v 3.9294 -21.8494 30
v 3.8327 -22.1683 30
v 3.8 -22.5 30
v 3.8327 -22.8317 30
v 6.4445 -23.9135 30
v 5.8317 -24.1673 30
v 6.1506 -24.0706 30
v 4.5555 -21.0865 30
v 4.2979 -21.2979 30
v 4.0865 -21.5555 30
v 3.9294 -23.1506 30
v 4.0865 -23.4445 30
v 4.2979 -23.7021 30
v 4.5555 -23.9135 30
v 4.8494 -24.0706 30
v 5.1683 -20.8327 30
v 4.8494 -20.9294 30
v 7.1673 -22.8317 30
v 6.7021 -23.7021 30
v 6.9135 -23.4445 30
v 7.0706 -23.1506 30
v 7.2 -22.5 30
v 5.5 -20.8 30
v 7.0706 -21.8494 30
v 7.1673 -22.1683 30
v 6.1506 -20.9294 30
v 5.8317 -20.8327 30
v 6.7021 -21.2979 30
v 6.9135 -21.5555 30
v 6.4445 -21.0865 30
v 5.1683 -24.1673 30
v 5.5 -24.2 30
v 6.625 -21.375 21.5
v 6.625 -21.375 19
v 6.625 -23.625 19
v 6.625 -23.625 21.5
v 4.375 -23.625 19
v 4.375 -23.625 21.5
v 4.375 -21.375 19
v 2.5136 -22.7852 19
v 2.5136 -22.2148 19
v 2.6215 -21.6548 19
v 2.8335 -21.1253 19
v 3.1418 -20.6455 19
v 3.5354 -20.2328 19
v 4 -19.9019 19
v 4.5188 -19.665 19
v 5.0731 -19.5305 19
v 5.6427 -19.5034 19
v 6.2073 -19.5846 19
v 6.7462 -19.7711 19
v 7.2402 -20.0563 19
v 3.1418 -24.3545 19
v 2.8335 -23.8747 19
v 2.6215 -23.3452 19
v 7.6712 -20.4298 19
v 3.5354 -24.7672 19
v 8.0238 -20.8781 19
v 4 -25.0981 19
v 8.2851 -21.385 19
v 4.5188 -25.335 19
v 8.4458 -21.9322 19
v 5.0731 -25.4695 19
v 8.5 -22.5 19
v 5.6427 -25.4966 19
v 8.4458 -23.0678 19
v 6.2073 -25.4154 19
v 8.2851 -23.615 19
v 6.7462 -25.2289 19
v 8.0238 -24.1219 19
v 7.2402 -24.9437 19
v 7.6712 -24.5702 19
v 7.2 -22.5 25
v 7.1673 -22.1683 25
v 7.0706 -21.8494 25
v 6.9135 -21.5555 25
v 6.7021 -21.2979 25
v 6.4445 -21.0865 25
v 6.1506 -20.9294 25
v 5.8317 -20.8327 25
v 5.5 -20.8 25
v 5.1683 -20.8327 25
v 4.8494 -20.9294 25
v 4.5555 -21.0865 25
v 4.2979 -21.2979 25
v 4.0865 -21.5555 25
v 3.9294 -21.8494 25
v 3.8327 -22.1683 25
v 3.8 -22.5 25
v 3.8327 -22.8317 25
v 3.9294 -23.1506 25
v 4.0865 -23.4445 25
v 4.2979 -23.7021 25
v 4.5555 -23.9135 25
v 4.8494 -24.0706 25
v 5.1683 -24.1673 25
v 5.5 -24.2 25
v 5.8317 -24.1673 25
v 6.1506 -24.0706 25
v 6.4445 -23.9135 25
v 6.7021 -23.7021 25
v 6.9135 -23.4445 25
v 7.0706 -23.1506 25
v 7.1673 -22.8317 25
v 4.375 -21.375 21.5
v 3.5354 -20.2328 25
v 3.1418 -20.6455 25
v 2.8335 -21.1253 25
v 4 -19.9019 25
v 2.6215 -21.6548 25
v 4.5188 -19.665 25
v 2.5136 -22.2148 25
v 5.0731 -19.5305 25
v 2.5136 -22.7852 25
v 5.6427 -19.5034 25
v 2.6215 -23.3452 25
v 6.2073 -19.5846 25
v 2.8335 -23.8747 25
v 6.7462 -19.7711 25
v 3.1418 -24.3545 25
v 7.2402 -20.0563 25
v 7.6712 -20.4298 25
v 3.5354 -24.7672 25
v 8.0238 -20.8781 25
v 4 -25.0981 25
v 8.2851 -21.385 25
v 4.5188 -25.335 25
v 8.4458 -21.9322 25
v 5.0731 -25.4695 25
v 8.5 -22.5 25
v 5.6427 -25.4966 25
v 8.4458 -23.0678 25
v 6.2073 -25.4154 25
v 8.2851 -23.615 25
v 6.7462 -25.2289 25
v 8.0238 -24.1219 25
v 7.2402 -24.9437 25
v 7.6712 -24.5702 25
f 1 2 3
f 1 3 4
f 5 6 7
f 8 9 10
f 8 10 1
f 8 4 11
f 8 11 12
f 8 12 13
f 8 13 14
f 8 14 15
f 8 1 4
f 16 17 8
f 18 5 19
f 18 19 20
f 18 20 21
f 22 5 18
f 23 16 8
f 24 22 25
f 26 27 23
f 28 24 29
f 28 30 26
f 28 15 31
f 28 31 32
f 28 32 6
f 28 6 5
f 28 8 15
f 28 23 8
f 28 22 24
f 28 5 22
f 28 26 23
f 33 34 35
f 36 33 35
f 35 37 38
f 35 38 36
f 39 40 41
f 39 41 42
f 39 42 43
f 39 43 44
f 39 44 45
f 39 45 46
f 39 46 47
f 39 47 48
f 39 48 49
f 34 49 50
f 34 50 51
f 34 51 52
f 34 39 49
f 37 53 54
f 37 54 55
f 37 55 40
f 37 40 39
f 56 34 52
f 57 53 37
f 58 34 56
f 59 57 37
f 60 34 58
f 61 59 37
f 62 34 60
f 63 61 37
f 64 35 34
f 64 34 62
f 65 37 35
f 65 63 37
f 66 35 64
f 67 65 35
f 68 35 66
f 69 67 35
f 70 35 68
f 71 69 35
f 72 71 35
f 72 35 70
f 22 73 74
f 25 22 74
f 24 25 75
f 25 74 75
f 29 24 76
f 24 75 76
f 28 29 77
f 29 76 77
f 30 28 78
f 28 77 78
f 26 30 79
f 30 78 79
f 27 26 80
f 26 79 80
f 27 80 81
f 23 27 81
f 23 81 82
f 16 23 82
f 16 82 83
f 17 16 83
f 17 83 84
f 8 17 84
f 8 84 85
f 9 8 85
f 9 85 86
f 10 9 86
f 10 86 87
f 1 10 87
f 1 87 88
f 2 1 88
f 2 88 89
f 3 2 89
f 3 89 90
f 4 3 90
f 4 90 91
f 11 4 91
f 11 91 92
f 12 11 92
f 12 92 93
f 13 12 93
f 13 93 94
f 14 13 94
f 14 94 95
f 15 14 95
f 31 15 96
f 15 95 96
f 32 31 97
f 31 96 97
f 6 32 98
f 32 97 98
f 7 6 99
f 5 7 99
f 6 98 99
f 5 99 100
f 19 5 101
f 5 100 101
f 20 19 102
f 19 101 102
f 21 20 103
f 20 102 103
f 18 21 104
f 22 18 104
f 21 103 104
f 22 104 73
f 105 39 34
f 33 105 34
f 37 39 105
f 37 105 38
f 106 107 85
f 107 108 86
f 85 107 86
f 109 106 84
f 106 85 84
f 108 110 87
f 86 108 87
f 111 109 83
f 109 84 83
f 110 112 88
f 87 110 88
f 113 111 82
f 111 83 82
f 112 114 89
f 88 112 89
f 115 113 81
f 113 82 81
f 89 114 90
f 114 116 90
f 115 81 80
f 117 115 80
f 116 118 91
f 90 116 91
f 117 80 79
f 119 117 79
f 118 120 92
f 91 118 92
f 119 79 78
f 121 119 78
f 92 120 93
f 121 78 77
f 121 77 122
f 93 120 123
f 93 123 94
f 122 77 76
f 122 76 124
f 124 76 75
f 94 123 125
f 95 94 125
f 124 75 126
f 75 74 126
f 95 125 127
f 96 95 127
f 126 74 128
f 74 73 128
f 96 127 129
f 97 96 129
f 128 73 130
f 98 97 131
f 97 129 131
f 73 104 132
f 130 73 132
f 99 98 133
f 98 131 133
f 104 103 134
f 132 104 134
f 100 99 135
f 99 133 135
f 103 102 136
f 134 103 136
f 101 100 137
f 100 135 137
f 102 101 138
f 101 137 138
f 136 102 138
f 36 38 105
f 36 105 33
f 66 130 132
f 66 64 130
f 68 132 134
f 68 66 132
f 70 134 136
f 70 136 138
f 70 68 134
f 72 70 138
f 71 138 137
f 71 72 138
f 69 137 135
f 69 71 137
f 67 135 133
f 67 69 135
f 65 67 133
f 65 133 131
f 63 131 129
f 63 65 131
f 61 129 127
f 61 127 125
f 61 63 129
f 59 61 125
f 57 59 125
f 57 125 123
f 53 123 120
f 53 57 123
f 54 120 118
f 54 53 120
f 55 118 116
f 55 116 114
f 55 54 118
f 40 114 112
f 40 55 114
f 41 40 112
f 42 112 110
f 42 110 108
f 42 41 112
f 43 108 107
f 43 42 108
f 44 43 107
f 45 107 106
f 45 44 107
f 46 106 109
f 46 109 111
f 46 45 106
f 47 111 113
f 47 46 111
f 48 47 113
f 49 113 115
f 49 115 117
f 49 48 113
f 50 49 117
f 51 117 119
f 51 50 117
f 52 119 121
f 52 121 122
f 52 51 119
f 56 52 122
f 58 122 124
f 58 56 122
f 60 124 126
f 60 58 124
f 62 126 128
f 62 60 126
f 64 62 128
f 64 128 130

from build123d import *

# Parameters (mm, degrees)
SKETCH098_W       = 1
SKETCH098_H       = 1
PAD061_DEPTH      = 4
SKETCH099_R       = 3
PAD062_DEPTH      = 3
PAD062_DEPTH_BACK = 3
SKETCH102_R       = 1.7
PAD063_DEPTH      = 8
SKETCH100_W       = 2.25
SKETCH100_H       = 2.25
POCKET048_DEPTH   = 2.5


with BuildPart() as part:
    # Sketch098 → Pad061 (new body)
    with BuildSketch(Plane(origin=(0, 0, 22), x_dir=(1, 0, 0), z_dir=(0, 0, -1))):
        with Locations((5.5, 22.5)):
            Rectangle(SKETCH098_W, SKETCH098_H)
    extrude(amount=-PAD061_DEPTH)

    # Sketch099 (on Face5 of Pad061) → Pad062 (join, two sides)
    with BuildSketch(Plane(origin=(0, 0, 22), x_dir=(1, 0, 0), z_dir=(0, 0, -1))) as pad062_sk:
        with Locations((5.5, 22.5)):
            Circle(SKETCH099_R)
    extrude(amount=PAD062_DEPTH)
    extrude(pad062_sk.sketch, amount=-PAD062_DEPTH_BACK)

    # Sketch102 → Pad063 (join)
    with BuildSketch(Plane.XY.offset(22)):
        with Locations((5.5, -22.5)):
            Circle(SKETCH102_R)
    extrude(amount=PAD063_DEPTH)

    # Sketch100 (on Face4 of Pad063) → Pocket048 (cut)
    with BuildSketch(Plane(origin=(0, 0, 19), x_dir=(1, 0, 0), z_dir=(0, 0, -1))):
        with Locations((5.5, 22.5)):
            Rectangle(SKETCH100_W, SKETCH100_H)
    extrude(amount=-POCKET048_DEPTH, mode=Mode.SUBTRACT)


solid = part.part
